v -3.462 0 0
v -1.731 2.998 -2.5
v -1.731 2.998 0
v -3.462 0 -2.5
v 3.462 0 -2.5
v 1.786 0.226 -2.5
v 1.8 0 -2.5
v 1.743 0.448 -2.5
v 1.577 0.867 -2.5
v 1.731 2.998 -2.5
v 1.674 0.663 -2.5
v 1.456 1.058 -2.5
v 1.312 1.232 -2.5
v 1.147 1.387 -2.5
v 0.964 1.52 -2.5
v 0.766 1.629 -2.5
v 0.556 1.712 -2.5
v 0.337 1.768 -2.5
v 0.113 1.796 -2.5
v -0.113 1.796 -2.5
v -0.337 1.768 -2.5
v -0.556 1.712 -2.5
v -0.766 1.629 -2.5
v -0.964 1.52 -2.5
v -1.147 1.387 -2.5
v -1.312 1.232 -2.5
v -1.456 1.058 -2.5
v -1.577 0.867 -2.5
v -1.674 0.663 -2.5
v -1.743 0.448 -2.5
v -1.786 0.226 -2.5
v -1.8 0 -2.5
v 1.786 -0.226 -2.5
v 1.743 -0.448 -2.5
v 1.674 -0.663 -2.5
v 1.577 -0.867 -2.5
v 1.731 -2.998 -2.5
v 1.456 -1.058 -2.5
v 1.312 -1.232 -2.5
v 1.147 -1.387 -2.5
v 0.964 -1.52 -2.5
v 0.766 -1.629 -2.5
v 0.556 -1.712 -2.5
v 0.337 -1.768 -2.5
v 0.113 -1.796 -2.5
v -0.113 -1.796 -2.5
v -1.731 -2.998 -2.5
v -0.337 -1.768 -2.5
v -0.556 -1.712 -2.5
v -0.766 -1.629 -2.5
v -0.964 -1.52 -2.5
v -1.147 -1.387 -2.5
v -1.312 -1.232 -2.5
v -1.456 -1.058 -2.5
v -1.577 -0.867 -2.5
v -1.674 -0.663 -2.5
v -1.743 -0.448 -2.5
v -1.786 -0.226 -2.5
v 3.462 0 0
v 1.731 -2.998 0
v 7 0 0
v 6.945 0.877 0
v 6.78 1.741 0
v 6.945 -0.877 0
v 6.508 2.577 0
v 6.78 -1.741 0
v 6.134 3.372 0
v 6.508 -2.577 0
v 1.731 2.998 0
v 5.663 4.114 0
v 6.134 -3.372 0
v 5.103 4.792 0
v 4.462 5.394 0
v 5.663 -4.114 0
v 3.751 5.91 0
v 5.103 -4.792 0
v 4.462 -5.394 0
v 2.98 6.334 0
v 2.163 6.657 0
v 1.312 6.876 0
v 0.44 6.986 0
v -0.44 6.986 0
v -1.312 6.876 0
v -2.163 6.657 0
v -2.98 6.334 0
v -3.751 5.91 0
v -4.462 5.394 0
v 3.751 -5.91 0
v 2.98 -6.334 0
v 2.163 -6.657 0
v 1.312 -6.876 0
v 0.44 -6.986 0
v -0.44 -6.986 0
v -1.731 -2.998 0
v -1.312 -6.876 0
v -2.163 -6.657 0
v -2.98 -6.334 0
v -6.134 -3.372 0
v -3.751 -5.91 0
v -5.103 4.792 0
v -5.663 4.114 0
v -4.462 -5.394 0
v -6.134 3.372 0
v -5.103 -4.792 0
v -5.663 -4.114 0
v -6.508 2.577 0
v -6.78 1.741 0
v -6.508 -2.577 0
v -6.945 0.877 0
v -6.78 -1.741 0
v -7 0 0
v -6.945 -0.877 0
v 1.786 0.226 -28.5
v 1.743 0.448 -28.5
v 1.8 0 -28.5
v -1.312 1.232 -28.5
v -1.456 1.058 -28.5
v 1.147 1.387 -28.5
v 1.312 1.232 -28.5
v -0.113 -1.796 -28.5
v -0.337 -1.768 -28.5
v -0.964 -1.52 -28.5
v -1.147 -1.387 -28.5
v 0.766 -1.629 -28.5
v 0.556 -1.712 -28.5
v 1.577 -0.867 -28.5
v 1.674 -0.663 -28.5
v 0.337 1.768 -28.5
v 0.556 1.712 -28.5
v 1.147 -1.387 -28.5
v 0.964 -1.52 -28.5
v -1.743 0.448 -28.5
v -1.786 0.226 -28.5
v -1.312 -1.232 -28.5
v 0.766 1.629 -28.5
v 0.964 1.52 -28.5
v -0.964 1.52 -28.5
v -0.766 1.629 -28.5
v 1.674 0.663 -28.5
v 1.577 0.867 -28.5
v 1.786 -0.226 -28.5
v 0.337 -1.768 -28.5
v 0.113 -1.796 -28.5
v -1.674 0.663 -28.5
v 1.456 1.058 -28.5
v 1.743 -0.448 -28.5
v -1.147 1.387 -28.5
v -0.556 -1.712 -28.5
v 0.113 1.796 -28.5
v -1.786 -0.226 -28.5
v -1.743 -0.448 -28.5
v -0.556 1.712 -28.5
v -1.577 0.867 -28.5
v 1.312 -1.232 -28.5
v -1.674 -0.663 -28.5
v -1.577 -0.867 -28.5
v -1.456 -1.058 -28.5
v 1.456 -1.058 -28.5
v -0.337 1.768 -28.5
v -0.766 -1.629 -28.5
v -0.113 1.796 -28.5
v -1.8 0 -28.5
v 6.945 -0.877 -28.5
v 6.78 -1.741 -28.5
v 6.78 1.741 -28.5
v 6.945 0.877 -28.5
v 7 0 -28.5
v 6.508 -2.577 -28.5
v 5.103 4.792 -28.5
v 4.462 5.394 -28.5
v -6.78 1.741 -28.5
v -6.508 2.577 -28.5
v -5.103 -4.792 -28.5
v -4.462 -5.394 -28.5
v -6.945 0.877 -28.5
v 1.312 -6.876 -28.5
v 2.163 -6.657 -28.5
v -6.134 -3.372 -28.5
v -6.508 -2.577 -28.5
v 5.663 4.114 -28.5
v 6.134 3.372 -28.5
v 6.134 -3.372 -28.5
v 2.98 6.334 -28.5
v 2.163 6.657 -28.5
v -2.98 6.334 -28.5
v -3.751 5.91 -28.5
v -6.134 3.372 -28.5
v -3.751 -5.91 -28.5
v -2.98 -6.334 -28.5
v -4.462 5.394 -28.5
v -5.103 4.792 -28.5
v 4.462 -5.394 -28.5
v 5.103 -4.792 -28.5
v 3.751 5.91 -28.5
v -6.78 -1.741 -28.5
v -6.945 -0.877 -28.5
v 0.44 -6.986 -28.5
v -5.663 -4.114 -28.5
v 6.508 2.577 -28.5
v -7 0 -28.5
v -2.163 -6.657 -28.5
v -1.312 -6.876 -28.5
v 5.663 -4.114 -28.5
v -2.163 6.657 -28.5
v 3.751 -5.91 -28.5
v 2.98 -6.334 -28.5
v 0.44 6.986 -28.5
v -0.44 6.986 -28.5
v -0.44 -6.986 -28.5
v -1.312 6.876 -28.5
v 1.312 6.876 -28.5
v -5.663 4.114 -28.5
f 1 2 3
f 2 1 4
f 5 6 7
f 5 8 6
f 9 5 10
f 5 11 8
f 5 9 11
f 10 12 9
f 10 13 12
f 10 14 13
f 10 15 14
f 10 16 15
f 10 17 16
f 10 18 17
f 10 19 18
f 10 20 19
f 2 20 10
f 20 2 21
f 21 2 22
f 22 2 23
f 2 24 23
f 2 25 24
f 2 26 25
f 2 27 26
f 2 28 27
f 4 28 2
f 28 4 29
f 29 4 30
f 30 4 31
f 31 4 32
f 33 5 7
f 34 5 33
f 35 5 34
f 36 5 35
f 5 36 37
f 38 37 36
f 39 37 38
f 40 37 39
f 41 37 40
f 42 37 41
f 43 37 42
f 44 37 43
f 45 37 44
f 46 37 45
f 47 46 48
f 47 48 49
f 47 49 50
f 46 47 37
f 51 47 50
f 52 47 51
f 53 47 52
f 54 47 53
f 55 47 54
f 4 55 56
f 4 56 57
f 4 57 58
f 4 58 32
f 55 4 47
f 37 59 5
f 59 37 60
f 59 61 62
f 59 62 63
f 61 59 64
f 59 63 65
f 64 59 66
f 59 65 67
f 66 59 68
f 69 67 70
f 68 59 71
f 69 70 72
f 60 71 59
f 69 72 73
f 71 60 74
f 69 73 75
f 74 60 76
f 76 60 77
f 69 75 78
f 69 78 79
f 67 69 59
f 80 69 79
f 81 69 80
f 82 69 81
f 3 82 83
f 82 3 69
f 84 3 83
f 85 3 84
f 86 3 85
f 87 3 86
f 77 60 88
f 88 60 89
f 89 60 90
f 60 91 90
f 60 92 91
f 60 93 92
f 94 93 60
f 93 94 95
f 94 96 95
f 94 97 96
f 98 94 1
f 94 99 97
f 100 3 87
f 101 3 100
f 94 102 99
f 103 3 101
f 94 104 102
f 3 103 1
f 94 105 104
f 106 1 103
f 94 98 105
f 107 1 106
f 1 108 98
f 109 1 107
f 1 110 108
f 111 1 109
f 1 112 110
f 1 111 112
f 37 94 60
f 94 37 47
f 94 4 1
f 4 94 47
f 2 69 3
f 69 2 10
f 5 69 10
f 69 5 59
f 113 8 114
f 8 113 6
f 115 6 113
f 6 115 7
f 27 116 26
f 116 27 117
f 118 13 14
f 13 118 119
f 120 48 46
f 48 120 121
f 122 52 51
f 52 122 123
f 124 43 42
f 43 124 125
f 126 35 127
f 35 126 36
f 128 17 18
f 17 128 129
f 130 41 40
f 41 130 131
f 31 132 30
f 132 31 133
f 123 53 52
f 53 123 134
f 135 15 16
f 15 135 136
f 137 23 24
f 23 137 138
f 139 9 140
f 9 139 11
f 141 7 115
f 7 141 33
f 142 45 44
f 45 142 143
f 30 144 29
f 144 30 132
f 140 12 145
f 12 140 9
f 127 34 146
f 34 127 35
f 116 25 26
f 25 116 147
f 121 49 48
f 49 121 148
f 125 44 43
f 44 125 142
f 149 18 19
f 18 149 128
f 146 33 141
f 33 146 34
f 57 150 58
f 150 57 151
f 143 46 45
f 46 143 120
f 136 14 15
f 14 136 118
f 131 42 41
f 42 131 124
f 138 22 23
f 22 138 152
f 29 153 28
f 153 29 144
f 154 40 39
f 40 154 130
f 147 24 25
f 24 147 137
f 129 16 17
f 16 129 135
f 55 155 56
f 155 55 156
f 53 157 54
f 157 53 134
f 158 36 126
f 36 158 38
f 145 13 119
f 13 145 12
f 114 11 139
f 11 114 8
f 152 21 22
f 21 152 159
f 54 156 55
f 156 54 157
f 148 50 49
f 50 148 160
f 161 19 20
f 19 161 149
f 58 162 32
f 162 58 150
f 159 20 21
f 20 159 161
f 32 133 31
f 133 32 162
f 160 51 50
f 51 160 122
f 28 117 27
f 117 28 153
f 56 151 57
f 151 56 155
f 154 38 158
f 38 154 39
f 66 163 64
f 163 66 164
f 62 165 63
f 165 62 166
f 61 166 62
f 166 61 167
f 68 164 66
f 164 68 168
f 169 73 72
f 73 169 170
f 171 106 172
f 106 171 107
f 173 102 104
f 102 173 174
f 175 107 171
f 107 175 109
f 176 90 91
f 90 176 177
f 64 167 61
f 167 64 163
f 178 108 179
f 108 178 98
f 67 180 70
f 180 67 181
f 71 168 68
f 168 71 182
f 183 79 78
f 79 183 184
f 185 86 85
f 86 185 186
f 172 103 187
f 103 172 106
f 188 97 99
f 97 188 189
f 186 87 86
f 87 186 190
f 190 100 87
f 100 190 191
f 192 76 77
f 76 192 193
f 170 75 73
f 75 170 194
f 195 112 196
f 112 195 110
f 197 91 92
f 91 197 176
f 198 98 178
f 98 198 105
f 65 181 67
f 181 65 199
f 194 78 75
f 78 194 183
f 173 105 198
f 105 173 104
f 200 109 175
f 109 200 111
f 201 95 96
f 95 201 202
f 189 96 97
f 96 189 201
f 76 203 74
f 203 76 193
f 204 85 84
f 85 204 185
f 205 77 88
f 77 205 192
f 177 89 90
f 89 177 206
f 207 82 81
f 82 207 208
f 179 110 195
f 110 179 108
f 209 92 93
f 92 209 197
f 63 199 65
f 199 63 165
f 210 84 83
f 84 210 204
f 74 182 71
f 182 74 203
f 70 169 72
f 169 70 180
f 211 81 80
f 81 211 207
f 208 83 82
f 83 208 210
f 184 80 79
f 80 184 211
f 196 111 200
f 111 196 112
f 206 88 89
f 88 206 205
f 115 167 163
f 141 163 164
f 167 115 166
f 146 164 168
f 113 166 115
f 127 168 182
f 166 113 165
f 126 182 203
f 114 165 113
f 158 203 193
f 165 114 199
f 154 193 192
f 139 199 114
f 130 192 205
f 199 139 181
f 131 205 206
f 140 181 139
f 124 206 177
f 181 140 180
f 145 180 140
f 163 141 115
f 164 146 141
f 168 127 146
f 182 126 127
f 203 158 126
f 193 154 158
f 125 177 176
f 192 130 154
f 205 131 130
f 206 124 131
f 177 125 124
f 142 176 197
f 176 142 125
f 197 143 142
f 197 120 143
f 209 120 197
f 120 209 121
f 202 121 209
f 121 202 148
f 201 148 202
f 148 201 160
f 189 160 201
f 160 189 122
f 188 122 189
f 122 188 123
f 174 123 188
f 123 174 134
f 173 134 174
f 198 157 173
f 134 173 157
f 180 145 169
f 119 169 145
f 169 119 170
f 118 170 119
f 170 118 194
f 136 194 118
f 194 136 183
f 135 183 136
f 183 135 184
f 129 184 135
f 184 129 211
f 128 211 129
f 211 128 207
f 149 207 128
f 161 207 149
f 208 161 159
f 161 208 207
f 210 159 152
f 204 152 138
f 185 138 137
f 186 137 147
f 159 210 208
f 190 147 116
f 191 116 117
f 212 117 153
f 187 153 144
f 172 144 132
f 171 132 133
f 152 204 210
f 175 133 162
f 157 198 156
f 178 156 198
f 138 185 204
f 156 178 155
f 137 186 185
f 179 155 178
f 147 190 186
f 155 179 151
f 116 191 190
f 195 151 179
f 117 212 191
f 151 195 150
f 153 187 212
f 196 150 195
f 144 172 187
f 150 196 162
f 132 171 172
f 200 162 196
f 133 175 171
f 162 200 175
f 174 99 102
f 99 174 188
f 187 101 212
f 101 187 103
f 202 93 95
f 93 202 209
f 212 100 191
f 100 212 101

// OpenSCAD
$fn = 50;

difference() {
	union() {
		translate(v = [0, 0, -28.5]) {
			cylinder(h = 28.5, r = 7.0);
		}
	}
	union() {
		translate(v = [0, 0, 0]) {
			rotate(a = [0, 0, 0]) {
				difference() {
					union() {
						translate(v = [0, 0, -2.5]) {
							linear_extrude(height = 2.5) {
								polygon(points = [[3.4619999999999997, 0.0], [1.7310000000000003, 2.9981799479017264], [-1.7309999999999992, 2.9981799479017264], [-3.4619999999999997, 4.2397272186481365e-16], [-1.7310000000000014, -2.998179947901726], [1.7309999999999977, -2.9981799479017277]]);
							}
						}
					}
					union();
				}
			}
		}
		#translate(v = [0, 0, -100.0]) {
			cylinder(h = 200, r = 1.8);
		}
	}
}
